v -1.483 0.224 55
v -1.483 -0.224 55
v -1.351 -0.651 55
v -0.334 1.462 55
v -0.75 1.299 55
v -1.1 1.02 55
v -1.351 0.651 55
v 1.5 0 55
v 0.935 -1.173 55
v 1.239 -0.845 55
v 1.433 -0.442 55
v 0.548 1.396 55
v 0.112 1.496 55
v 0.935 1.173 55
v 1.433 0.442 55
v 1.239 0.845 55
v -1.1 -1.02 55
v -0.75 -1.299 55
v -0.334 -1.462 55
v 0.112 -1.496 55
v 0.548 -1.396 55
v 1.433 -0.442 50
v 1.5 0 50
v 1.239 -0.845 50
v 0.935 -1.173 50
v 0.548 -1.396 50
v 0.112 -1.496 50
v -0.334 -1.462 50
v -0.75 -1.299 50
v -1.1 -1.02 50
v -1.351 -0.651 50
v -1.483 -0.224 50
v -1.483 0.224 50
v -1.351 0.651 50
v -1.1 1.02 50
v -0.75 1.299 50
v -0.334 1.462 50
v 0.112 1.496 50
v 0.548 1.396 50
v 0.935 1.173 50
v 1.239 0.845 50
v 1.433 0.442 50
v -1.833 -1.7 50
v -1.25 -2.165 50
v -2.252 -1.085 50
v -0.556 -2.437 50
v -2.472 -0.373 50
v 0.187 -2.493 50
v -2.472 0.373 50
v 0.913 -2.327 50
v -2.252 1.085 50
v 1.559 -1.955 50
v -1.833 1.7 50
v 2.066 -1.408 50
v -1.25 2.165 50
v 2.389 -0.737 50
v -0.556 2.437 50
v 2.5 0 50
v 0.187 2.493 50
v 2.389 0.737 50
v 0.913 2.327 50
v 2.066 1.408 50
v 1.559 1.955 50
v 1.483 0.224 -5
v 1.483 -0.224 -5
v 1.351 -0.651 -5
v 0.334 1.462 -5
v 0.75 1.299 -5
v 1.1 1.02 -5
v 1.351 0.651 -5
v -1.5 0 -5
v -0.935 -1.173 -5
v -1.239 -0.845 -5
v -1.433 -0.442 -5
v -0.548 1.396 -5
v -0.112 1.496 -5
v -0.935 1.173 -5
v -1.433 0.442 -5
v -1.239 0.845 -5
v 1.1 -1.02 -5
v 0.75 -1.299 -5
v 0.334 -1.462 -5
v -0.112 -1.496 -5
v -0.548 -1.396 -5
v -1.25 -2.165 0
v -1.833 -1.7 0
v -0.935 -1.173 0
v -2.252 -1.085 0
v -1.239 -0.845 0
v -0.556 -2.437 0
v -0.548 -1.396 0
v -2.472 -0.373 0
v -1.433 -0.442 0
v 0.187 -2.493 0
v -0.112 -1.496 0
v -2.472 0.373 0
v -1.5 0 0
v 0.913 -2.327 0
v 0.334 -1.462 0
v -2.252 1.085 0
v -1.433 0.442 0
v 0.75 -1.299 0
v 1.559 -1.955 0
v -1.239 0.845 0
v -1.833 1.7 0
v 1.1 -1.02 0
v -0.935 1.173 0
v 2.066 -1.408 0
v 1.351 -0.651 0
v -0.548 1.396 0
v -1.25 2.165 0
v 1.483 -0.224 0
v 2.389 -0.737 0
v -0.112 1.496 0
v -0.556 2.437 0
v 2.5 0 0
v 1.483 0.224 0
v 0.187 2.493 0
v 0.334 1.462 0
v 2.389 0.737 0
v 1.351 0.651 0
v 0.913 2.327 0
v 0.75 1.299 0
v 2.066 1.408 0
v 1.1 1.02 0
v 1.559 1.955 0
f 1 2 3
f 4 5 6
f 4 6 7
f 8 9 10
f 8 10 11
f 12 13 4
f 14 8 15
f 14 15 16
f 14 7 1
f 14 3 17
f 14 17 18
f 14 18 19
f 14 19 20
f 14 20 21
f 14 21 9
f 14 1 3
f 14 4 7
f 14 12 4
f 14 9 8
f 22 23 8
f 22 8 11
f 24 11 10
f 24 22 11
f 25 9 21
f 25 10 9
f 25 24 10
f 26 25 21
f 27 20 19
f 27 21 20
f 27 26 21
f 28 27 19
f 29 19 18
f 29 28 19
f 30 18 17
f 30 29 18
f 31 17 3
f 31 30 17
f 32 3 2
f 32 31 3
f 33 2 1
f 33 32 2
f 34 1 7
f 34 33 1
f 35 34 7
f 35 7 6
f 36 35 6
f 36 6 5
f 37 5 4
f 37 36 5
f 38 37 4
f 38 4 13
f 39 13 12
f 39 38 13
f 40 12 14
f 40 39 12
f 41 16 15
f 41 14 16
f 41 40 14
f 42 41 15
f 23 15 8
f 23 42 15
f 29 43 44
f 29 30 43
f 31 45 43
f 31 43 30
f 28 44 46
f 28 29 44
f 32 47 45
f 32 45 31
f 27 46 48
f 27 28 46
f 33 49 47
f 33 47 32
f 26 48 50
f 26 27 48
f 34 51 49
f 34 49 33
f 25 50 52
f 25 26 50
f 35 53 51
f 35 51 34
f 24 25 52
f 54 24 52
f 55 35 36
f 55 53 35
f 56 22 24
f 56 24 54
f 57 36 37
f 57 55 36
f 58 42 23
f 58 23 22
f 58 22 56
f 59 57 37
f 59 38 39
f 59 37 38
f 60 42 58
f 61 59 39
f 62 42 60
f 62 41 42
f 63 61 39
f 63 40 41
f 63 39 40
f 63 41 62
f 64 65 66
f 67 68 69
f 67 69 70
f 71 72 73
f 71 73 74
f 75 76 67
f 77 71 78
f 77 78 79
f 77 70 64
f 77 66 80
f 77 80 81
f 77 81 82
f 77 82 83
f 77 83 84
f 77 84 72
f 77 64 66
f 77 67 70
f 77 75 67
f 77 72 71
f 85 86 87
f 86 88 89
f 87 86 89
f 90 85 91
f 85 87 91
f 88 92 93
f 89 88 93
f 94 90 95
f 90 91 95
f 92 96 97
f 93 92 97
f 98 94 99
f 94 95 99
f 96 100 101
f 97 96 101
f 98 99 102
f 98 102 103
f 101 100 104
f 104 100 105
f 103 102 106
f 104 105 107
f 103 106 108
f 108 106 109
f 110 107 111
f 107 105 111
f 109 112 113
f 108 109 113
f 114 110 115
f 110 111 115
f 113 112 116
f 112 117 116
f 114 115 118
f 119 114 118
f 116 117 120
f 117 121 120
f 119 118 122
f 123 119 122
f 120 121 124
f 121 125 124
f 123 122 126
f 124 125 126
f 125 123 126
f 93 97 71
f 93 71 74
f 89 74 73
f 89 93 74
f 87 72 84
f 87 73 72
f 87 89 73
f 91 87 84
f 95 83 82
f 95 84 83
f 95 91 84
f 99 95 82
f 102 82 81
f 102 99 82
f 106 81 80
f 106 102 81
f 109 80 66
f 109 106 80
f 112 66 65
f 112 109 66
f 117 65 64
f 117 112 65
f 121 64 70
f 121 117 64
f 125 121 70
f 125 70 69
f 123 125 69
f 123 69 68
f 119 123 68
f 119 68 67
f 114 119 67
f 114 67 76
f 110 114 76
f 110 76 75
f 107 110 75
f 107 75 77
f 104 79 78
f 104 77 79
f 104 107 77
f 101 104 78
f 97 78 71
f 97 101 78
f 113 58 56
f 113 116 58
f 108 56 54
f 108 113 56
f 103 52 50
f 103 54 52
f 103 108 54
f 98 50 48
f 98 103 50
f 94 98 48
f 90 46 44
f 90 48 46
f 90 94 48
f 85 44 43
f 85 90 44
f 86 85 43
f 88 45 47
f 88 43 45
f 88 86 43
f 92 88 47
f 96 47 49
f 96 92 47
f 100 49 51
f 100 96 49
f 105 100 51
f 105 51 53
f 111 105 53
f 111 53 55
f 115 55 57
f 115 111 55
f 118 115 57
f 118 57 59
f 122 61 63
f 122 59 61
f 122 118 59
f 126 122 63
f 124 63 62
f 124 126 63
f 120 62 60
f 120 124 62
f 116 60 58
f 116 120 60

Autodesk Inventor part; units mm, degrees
ref_plane "YZ Plane" through (0, 0, 0) normal (1, 0, 0) x (0, 1, 0)
ref_plane "XZ Plane" through (0, 0, 0) normal (0, 1, 0) x (-1, 0, 0)
ref_plane "XY Plane" through (0, 0, 0) normal (0, 0, 1) x (1, 0, 0)
sketch "Sketch1" plane through (0, 0, 0) normal (0, 0, 1) x (1, 0, 0)
  circle A0 centre (0, 0) radius 2.5
  dimension "d0" = 5
extrude "Extrusion1" add sketch "Sketch1" along normal blind 50
sketch "Sketch2" plane through (0, 0, 50) normal (0, 0, 1) x (1, 0, 0)
  circle A0 centre (0, 0) radius 2.5 projected
  circle A1 centre (0, 0) radius 1.5
  dimension "d3" = 3
extrude "Extrusion2" add sketch "Sketch2" along normal blind 5 contours A1
thread "Thread1" size "M3x0.5" class "6g" standard "ANSI Metric M Profile" full length
sketch "Sketch3" plane through (0, 0, 0) normal (0, 0, -1) x (-1, 0, 0)
  circle A0 centre (0, 0) radius 2.5 projected
  circle A1 centre (0, 0) radius 1.5
  dimension "d8" = 3
extrude "Extrusion3" add sketch "Sketch3" along normal blind 5 contours A1
thread "Thread2" size "M3x0.5" class "6g" standard "ANSI Metric M Profile" full length
properties part number "spacer 5 cm"
